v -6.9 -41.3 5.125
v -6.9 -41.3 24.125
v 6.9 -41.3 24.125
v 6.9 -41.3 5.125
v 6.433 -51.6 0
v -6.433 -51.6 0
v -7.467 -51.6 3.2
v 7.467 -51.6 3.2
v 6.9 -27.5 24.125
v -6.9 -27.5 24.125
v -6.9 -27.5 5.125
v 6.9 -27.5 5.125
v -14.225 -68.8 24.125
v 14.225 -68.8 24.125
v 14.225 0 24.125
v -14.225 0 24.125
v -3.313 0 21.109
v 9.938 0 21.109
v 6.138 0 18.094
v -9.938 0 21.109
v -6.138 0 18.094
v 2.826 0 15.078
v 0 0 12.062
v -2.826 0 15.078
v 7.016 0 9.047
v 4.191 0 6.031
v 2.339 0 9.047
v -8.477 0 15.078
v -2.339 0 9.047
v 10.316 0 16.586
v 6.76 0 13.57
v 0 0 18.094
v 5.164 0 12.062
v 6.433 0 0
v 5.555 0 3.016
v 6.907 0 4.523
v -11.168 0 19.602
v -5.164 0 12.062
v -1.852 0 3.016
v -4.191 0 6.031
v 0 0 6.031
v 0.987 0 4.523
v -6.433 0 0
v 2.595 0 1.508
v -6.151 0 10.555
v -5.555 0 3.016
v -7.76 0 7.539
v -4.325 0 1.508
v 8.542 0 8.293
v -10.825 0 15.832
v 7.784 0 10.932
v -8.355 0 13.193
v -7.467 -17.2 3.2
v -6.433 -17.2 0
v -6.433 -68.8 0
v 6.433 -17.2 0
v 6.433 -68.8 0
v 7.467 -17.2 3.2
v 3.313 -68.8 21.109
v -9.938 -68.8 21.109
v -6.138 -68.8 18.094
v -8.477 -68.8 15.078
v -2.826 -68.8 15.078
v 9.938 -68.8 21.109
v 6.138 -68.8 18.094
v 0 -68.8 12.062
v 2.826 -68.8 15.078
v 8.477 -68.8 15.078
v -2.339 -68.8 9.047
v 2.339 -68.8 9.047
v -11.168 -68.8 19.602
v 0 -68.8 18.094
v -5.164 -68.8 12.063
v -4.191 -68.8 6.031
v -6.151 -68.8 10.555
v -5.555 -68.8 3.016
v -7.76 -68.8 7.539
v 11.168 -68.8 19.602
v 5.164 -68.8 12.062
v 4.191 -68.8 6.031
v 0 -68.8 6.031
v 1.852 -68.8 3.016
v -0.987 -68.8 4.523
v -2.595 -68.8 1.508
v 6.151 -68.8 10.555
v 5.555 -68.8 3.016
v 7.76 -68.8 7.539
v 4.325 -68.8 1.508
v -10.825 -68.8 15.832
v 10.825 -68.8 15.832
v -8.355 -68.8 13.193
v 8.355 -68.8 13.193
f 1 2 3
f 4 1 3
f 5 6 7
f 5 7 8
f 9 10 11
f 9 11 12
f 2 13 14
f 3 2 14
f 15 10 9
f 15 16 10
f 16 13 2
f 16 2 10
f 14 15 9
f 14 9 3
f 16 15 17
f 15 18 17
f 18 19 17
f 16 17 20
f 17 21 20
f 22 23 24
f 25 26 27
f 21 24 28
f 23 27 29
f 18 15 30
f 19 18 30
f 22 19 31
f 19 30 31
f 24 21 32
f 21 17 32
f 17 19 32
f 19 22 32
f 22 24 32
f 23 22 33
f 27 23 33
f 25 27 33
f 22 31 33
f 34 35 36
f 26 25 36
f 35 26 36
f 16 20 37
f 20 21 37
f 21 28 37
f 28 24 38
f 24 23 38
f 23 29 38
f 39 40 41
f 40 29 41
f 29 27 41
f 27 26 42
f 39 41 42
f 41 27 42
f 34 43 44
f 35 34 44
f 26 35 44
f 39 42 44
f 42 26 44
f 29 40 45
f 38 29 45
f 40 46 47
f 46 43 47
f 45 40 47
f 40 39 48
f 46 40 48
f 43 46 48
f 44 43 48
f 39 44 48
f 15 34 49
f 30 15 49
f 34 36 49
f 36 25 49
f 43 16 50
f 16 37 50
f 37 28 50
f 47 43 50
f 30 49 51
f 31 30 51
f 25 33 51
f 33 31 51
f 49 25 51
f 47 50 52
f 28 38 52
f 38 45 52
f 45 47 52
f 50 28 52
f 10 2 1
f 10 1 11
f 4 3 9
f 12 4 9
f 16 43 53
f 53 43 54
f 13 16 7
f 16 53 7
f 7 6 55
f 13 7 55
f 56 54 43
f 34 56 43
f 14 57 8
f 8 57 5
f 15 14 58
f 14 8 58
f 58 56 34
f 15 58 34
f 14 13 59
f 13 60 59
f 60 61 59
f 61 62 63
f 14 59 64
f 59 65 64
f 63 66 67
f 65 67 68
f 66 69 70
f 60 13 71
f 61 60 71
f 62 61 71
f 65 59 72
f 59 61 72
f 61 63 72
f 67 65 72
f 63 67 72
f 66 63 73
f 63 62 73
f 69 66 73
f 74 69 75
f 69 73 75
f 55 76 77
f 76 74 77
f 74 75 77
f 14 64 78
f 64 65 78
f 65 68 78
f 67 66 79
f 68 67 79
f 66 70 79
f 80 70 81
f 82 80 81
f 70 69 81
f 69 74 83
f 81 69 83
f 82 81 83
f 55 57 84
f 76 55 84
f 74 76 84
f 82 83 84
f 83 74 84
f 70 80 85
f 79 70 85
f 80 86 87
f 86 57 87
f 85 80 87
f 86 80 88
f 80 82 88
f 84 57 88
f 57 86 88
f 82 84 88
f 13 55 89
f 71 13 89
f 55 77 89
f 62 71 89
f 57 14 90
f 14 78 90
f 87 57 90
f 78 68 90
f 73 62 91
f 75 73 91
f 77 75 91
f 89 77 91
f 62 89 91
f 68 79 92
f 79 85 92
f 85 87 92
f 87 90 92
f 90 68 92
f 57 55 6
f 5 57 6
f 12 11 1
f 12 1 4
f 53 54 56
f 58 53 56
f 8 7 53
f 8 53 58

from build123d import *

# Parameters (mm, degrees)
F1_W      = 36.2
F1_H      = 68.8
F2_W      = 12.866667
F2_H      = 68.8
F3_FACE_W = 36.2
F3_FACE_H = 68.8
F4_DEPTH  = 12
F5_W      = 13.8
F5_H      = 13.8
F6_DEPTH  = 31
F7_W      = 20
F7_H      = 34.4
F8_DEPTH  = 3.2


with BuildPart() as f3:
    # F1 (on offset) → F3 section 0
    with BuildSketch(Plane.XY.offset(36.125)):
        with Locations((0, -34.4)):
            Rectangle(F1_W, F1_H)
    # F2 (on Top) → F3 section 1
    with BuildSketch(Plane.XY):
        with Locations((-3.3e-05, -34.4)):
            Rectangle(F2_W, F2_H)
    loft()

    # F3_face (on face) → F4 (cut)
    with BuildSketch(Plane(origin=(0, -34.4, 36.125), x_dir=(1, 0, 0), z_dir=(0, 0, 1))):
        Rectangle(F3_FACE_W, F3_FACE_H)
    extrude(amount=-F4_DEPTH, mode=Mode.SUBTRACT)

    # F5 (on offset) → F6 (cut)
    with BuildSketch(Plane.XY.offset(36.125)):
        with Locations((0, -34.4)):
            Rectangle(F5_W, F5_H)
    extrude(amount=-F6_DEPTH, mode=Mode.SUBTRACT)

    # F7 (on Top) → F8 (cut)
    with BuildSketch(Plane.XY):
        with Locations((0, -34.4)):
            Rectangle(F7_W, F7_H)
    extrude(amount=F8_DEPTH, mode=Mode.SUBTRACT)


solid = f3.part
